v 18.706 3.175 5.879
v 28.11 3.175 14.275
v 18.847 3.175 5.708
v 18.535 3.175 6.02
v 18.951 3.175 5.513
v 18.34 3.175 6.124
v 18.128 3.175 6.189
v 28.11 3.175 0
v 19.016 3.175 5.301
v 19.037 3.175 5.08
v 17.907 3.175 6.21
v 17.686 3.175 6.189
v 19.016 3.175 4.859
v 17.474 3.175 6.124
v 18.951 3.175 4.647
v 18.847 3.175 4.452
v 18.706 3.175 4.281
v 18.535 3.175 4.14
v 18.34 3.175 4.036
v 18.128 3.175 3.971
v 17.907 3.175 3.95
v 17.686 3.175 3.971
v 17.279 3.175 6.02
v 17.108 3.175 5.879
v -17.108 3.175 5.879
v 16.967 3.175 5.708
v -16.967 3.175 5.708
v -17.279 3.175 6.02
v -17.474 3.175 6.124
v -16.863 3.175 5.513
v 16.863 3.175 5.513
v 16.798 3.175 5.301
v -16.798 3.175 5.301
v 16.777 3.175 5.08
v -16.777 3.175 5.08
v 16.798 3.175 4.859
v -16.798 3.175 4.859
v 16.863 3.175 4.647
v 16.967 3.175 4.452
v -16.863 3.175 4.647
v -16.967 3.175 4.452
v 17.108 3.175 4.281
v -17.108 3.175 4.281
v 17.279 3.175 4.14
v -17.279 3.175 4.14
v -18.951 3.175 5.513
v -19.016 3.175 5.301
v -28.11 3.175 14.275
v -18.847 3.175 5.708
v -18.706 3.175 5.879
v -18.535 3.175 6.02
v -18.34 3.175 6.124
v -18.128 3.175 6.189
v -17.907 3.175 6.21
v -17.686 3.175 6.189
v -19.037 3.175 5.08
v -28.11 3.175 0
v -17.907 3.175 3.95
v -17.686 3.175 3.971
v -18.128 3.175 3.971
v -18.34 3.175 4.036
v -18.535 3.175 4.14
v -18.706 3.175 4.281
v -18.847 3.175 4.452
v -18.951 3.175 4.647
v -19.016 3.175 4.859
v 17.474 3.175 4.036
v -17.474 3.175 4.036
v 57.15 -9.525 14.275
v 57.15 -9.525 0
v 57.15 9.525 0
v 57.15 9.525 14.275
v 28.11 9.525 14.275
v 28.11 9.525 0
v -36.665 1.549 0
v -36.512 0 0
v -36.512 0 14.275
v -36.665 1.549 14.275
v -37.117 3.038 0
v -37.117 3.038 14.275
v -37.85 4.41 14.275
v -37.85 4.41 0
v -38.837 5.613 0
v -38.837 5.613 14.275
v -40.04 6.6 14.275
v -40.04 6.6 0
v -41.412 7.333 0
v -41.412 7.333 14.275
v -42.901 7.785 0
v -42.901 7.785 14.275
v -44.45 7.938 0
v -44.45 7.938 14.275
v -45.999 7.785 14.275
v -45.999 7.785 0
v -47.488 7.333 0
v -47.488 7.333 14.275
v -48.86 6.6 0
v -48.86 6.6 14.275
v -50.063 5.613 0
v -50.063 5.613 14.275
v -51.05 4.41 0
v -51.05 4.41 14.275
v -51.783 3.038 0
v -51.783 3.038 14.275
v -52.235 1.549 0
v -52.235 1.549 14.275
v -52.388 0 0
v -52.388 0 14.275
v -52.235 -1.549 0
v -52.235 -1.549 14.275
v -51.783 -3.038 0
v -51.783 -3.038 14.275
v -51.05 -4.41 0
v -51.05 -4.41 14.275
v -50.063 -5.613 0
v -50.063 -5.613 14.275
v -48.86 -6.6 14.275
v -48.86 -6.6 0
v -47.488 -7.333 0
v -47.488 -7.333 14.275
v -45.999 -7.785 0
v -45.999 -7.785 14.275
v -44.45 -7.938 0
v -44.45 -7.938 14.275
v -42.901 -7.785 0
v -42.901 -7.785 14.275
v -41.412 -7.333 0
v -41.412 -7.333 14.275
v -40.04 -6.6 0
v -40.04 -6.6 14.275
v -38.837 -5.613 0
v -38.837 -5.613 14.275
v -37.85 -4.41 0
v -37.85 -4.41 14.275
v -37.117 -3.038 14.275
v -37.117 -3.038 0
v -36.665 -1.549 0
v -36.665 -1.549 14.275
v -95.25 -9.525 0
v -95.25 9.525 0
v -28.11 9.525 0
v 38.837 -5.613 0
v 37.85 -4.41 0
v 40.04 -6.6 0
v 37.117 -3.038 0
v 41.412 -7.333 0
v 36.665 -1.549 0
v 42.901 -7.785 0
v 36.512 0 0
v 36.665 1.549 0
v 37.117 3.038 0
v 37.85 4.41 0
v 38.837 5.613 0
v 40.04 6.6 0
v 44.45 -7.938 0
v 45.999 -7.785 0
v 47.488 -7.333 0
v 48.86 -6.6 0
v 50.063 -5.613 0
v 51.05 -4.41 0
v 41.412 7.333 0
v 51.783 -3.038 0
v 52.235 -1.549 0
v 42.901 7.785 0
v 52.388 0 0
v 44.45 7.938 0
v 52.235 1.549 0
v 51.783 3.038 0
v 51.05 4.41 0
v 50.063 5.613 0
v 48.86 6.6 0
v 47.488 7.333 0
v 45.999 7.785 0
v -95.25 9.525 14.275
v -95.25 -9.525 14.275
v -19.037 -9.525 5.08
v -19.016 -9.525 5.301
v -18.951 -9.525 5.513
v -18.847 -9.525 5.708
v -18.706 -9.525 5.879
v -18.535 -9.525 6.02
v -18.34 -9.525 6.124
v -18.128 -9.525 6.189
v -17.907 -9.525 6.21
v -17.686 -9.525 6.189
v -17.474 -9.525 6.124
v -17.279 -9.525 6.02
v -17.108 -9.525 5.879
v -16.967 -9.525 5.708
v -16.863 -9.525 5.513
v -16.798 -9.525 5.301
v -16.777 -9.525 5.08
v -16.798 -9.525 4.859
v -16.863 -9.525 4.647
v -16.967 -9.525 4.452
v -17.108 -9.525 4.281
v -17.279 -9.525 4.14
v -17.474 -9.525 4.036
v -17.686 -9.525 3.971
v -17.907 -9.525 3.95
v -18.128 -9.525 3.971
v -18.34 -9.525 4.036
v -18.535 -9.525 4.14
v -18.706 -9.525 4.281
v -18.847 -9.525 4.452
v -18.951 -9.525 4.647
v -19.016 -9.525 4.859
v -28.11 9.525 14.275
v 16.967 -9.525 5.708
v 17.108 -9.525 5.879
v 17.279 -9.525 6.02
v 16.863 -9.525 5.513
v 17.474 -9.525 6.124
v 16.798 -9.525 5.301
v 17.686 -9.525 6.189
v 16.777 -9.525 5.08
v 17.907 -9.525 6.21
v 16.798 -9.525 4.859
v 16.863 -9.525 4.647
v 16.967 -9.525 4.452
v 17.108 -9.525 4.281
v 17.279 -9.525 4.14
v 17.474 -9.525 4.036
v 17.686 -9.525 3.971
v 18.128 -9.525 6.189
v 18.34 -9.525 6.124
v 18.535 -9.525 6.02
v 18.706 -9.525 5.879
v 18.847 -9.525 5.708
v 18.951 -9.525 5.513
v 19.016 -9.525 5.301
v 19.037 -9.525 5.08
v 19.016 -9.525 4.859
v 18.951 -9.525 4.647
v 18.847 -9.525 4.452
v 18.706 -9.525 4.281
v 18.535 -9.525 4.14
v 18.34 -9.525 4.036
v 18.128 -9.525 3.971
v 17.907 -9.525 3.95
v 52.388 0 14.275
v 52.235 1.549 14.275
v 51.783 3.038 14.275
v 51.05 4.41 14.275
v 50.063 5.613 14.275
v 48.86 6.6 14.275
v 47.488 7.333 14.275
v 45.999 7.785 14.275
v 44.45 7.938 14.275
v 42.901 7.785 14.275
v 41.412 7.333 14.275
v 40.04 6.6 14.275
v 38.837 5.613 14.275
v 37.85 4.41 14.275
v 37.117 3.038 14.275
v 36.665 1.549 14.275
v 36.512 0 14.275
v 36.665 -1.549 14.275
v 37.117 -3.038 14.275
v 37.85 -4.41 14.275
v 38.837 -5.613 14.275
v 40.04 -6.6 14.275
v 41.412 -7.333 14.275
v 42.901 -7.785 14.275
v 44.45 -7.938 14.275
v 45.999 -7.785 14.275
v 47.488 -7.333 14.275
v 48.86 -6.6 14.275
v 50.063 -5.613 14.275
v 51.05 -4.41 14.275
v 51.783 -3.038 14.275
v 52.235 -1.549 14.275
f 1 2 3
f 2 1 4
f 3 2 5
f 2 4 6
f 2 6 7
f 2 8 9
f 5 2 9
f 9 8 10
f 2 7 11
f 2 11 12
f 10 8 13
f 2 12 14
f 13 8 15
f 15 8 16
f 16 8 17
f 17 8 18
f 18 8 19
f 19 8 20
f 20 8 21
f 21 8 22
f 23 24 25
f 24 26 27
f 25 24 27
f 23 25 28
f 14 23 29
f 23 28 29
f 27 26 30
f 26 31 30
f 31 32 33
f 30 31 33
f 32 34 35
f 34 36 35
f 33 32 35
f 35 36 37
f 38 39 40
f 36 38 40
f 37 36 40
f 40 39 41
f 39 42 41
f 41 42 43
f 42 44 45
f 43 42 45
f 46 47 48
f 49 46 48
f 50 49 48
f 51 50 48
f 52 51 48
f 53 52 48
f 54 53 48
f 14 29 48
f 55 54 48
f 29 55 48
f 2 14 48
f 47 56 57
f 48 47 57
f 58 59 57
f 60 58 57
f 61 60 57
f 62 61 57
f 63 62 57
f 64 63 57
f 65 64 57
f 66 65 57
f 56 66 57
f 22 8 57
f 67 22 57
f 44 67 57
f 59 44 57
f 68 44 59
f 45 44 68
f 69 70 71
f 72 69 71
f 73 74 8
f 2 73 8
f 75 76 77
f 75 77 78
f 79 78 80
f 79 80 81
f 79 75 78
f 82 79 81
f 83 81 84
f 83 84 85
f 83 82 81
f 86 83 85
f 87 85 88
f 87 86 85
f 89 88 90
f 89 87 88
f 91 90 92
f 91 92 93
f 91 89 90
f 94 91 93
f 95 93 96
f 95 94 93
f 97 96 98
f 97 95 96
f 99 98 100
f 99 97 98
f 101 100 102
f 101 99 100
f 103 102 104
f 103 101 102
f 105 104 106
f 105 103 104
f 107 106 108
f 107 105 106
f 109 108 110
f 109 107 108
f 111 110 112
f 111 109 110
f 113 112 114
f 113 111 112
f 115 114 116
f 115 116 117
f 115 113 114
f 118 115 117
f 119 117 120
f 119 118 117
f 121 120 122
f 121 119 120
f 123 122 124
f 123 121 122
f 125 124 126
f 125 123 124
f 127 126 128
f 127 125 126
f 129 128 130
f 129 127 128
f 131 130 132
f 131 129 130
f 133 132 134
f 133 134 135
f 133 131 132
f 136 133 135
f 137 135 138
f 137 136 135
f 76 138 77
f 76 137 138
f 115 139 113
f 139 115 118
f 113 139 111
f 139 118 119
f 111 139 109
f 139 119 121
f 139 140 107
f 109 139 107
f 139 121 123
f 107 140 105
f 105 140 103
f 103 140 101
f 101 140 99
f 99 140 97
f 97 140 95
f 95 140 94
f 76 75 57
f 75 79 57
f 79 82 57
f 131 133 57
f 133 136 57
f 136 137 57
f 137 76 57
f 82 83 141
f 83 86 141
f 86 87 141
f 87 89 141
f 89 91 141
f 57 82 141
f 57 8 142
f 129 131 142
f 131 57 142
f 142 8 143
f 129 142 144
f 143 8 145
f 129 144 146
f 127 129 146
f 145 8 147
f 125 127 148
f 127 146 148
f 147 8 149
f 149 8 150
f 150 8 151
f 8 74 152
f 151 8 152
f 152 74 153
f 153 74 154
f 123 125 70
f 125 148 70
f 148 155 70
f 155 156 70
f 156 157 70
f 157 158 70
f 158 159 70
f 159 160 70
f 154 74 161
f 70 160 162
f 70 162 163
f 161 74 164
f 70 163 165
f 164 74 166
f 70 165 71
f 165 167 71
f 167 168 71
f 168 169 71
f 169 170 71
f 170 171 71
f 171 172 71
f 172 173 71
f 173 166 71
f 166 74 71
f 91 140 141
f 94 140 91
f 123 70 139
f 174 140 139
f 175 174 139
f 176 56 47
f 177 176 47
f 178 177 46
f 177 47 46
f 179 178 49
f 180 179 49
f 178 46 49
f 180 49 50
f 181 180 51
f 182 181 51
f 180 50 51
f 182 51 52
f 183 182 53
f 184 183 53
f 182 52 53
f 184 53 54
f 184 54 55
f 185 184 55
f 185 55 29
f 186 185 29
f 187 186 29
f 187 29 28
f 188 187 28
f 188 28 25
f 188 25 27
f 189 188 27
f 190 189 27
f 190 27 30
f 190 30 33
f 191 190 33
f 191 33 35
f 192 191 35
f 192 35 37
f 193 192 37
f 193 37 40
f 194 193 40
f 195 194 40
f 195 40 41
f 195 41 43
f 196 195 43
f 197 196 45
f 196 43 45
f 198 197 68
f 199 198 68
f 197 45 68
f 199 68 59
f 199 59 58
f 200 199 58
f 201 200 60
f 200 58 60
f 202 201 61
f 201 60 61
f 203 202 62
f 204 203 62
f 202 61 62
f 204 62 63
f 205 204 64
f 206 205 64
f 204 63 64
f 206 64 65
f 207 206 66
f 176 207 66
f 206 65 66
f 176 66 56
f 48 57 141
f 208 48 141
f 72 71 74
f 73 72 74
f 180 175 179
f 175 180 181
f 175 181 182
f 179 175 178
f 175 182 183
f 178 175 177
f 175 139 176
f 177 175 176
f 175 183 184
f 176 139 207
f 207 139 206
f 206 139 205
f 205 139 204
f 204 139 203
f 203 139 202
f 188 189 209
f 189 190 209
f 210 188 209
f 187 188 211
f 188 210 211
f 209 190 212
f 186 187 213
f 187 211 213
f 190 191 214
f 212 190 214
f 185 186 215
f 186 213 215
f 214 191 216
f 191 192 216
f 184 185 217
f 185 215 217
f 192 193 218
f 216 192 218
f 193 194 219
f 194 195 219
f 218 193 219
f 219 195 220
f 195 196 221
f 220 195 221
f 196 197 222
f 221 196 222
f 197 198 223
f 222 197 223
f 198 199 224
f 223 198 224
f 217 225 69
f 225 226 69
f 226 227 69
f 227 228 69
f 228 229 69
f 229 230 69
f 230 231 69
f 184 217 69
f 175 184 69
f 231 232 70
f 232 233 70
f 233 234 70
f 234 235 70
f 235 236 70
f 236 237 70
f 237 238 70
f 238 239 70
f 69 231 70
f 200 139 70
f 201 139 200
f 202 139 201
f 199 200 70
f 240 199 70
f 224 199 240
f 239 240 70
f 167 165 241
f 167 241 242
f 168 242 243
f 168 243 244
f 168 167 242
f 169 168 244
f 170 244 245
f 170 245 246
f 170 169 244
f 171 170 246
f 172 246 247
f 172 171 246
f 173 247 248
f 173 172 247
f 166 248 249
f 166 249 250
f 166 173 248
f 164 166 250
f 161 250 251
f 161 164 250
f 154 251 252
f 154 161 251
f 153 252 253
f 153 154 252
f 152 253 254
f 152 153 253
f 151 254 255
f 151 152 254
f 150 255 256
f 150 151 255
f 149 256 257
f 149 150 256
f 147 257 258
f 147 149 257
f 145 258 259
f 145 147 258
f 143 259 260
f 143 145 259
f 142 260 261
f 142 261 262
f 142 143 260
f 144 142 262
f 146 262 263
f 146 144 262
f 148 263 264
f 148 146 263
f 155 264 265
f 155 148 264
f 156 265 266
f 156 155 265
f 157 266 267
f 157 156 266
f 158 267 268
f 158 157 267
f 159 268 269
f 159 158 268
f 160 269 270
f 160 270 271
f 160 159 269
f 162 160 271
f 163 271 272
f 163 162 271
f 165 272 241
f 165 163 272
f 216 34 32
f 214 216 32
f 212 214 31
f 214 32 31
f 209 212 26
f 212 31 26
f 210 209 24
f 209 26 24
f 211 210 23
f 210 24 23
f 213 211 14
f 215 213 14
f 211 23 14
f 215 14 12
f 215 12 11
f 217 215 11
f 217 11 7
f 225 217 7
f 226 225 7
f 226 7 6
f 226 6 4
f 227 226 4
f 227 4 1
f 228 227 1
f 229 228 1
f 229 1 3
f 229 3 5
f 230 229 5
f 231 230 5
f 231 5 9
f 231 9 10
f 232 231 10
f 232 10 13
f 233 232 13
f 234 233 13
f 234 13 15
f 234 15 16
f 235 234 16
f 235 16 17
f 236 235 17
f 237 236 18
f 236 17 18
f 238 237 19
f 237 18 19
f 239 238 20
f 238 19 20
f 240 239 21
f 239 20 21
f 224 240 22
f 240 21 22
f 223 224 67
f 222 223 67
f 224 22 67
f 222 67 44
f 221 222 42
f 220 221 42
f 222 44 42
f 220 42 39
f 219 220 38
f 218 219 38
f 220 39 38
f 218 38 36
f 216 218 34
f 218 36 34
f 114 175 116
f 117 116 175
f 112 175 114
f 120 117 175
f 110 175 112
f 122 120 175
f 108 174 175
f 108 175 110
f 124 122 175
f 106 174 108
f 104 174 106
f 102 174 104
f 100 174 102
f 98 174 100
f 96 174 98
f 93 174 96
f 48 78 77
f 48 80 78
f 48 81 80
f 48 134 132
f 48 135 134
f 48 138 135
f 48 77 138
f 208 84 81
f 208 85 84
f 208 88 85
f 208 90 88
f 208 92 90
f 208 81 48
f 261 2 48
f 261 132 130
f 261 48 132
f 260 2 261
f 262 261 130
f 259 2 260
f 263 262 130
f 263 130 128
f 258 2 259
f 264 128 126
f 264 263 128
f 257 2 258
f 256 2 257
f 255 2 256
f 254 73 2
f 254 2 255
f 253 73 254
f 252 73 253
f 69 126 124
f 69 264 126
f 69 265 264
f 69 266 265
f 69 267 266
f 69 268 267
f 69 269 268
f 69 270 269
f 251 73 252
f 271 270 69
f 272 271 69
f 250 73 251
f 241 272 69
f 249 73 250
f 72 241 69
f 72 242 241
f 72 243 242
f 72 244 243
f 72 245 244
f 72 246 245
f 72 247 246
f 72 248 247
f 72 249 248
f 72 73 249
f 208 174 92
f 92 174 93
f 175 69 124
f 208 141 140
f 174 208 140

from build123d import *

# Parameters (mm, degrees)
F0_R     = 7.9375
F1_DEPTH = 14.2748
F2_R     = 1.1303
F3_DEPTH = 12.701


with BuildPart() as f1:
    # F0 (on Top) → F1 (new body)
    with BuildSketch(Plane.XY):
        Polygon((57.15, -9.525), (57.15, 9.525), (28.109774, 9.525), (28.109774, 3.175), (-28.109774, 3.175), (-28.109774, 9.525), (-95.25, 9.525), (-95.25, -9.525), align=None)
        with Locations((-44.45, 0)):
            Circle(F0_R, mode=Mode.SUBTRACT)
        with Locations((44.45, 0)):
            Circle(F0_R, mode=Mode.SUBTRACT)
    extrude(amount=F1_DEPTH)

    # F2 (on face) → F3 (cut, through all)
    with BuildSketch(Plane(origin=(0, 3.175, 0), x_dir=(-1, 0, 0), z_dir=(0, 1, 0))):
        with Locations((-17.907, 5.08)):
            Circle(F2_R)
        with Locations((17.907, 5.08)):
            Circle(F2_R)
    extrude(amount=-F3_DEPTH, mode=Mode.SUBTRACT)


solid = f1.part
